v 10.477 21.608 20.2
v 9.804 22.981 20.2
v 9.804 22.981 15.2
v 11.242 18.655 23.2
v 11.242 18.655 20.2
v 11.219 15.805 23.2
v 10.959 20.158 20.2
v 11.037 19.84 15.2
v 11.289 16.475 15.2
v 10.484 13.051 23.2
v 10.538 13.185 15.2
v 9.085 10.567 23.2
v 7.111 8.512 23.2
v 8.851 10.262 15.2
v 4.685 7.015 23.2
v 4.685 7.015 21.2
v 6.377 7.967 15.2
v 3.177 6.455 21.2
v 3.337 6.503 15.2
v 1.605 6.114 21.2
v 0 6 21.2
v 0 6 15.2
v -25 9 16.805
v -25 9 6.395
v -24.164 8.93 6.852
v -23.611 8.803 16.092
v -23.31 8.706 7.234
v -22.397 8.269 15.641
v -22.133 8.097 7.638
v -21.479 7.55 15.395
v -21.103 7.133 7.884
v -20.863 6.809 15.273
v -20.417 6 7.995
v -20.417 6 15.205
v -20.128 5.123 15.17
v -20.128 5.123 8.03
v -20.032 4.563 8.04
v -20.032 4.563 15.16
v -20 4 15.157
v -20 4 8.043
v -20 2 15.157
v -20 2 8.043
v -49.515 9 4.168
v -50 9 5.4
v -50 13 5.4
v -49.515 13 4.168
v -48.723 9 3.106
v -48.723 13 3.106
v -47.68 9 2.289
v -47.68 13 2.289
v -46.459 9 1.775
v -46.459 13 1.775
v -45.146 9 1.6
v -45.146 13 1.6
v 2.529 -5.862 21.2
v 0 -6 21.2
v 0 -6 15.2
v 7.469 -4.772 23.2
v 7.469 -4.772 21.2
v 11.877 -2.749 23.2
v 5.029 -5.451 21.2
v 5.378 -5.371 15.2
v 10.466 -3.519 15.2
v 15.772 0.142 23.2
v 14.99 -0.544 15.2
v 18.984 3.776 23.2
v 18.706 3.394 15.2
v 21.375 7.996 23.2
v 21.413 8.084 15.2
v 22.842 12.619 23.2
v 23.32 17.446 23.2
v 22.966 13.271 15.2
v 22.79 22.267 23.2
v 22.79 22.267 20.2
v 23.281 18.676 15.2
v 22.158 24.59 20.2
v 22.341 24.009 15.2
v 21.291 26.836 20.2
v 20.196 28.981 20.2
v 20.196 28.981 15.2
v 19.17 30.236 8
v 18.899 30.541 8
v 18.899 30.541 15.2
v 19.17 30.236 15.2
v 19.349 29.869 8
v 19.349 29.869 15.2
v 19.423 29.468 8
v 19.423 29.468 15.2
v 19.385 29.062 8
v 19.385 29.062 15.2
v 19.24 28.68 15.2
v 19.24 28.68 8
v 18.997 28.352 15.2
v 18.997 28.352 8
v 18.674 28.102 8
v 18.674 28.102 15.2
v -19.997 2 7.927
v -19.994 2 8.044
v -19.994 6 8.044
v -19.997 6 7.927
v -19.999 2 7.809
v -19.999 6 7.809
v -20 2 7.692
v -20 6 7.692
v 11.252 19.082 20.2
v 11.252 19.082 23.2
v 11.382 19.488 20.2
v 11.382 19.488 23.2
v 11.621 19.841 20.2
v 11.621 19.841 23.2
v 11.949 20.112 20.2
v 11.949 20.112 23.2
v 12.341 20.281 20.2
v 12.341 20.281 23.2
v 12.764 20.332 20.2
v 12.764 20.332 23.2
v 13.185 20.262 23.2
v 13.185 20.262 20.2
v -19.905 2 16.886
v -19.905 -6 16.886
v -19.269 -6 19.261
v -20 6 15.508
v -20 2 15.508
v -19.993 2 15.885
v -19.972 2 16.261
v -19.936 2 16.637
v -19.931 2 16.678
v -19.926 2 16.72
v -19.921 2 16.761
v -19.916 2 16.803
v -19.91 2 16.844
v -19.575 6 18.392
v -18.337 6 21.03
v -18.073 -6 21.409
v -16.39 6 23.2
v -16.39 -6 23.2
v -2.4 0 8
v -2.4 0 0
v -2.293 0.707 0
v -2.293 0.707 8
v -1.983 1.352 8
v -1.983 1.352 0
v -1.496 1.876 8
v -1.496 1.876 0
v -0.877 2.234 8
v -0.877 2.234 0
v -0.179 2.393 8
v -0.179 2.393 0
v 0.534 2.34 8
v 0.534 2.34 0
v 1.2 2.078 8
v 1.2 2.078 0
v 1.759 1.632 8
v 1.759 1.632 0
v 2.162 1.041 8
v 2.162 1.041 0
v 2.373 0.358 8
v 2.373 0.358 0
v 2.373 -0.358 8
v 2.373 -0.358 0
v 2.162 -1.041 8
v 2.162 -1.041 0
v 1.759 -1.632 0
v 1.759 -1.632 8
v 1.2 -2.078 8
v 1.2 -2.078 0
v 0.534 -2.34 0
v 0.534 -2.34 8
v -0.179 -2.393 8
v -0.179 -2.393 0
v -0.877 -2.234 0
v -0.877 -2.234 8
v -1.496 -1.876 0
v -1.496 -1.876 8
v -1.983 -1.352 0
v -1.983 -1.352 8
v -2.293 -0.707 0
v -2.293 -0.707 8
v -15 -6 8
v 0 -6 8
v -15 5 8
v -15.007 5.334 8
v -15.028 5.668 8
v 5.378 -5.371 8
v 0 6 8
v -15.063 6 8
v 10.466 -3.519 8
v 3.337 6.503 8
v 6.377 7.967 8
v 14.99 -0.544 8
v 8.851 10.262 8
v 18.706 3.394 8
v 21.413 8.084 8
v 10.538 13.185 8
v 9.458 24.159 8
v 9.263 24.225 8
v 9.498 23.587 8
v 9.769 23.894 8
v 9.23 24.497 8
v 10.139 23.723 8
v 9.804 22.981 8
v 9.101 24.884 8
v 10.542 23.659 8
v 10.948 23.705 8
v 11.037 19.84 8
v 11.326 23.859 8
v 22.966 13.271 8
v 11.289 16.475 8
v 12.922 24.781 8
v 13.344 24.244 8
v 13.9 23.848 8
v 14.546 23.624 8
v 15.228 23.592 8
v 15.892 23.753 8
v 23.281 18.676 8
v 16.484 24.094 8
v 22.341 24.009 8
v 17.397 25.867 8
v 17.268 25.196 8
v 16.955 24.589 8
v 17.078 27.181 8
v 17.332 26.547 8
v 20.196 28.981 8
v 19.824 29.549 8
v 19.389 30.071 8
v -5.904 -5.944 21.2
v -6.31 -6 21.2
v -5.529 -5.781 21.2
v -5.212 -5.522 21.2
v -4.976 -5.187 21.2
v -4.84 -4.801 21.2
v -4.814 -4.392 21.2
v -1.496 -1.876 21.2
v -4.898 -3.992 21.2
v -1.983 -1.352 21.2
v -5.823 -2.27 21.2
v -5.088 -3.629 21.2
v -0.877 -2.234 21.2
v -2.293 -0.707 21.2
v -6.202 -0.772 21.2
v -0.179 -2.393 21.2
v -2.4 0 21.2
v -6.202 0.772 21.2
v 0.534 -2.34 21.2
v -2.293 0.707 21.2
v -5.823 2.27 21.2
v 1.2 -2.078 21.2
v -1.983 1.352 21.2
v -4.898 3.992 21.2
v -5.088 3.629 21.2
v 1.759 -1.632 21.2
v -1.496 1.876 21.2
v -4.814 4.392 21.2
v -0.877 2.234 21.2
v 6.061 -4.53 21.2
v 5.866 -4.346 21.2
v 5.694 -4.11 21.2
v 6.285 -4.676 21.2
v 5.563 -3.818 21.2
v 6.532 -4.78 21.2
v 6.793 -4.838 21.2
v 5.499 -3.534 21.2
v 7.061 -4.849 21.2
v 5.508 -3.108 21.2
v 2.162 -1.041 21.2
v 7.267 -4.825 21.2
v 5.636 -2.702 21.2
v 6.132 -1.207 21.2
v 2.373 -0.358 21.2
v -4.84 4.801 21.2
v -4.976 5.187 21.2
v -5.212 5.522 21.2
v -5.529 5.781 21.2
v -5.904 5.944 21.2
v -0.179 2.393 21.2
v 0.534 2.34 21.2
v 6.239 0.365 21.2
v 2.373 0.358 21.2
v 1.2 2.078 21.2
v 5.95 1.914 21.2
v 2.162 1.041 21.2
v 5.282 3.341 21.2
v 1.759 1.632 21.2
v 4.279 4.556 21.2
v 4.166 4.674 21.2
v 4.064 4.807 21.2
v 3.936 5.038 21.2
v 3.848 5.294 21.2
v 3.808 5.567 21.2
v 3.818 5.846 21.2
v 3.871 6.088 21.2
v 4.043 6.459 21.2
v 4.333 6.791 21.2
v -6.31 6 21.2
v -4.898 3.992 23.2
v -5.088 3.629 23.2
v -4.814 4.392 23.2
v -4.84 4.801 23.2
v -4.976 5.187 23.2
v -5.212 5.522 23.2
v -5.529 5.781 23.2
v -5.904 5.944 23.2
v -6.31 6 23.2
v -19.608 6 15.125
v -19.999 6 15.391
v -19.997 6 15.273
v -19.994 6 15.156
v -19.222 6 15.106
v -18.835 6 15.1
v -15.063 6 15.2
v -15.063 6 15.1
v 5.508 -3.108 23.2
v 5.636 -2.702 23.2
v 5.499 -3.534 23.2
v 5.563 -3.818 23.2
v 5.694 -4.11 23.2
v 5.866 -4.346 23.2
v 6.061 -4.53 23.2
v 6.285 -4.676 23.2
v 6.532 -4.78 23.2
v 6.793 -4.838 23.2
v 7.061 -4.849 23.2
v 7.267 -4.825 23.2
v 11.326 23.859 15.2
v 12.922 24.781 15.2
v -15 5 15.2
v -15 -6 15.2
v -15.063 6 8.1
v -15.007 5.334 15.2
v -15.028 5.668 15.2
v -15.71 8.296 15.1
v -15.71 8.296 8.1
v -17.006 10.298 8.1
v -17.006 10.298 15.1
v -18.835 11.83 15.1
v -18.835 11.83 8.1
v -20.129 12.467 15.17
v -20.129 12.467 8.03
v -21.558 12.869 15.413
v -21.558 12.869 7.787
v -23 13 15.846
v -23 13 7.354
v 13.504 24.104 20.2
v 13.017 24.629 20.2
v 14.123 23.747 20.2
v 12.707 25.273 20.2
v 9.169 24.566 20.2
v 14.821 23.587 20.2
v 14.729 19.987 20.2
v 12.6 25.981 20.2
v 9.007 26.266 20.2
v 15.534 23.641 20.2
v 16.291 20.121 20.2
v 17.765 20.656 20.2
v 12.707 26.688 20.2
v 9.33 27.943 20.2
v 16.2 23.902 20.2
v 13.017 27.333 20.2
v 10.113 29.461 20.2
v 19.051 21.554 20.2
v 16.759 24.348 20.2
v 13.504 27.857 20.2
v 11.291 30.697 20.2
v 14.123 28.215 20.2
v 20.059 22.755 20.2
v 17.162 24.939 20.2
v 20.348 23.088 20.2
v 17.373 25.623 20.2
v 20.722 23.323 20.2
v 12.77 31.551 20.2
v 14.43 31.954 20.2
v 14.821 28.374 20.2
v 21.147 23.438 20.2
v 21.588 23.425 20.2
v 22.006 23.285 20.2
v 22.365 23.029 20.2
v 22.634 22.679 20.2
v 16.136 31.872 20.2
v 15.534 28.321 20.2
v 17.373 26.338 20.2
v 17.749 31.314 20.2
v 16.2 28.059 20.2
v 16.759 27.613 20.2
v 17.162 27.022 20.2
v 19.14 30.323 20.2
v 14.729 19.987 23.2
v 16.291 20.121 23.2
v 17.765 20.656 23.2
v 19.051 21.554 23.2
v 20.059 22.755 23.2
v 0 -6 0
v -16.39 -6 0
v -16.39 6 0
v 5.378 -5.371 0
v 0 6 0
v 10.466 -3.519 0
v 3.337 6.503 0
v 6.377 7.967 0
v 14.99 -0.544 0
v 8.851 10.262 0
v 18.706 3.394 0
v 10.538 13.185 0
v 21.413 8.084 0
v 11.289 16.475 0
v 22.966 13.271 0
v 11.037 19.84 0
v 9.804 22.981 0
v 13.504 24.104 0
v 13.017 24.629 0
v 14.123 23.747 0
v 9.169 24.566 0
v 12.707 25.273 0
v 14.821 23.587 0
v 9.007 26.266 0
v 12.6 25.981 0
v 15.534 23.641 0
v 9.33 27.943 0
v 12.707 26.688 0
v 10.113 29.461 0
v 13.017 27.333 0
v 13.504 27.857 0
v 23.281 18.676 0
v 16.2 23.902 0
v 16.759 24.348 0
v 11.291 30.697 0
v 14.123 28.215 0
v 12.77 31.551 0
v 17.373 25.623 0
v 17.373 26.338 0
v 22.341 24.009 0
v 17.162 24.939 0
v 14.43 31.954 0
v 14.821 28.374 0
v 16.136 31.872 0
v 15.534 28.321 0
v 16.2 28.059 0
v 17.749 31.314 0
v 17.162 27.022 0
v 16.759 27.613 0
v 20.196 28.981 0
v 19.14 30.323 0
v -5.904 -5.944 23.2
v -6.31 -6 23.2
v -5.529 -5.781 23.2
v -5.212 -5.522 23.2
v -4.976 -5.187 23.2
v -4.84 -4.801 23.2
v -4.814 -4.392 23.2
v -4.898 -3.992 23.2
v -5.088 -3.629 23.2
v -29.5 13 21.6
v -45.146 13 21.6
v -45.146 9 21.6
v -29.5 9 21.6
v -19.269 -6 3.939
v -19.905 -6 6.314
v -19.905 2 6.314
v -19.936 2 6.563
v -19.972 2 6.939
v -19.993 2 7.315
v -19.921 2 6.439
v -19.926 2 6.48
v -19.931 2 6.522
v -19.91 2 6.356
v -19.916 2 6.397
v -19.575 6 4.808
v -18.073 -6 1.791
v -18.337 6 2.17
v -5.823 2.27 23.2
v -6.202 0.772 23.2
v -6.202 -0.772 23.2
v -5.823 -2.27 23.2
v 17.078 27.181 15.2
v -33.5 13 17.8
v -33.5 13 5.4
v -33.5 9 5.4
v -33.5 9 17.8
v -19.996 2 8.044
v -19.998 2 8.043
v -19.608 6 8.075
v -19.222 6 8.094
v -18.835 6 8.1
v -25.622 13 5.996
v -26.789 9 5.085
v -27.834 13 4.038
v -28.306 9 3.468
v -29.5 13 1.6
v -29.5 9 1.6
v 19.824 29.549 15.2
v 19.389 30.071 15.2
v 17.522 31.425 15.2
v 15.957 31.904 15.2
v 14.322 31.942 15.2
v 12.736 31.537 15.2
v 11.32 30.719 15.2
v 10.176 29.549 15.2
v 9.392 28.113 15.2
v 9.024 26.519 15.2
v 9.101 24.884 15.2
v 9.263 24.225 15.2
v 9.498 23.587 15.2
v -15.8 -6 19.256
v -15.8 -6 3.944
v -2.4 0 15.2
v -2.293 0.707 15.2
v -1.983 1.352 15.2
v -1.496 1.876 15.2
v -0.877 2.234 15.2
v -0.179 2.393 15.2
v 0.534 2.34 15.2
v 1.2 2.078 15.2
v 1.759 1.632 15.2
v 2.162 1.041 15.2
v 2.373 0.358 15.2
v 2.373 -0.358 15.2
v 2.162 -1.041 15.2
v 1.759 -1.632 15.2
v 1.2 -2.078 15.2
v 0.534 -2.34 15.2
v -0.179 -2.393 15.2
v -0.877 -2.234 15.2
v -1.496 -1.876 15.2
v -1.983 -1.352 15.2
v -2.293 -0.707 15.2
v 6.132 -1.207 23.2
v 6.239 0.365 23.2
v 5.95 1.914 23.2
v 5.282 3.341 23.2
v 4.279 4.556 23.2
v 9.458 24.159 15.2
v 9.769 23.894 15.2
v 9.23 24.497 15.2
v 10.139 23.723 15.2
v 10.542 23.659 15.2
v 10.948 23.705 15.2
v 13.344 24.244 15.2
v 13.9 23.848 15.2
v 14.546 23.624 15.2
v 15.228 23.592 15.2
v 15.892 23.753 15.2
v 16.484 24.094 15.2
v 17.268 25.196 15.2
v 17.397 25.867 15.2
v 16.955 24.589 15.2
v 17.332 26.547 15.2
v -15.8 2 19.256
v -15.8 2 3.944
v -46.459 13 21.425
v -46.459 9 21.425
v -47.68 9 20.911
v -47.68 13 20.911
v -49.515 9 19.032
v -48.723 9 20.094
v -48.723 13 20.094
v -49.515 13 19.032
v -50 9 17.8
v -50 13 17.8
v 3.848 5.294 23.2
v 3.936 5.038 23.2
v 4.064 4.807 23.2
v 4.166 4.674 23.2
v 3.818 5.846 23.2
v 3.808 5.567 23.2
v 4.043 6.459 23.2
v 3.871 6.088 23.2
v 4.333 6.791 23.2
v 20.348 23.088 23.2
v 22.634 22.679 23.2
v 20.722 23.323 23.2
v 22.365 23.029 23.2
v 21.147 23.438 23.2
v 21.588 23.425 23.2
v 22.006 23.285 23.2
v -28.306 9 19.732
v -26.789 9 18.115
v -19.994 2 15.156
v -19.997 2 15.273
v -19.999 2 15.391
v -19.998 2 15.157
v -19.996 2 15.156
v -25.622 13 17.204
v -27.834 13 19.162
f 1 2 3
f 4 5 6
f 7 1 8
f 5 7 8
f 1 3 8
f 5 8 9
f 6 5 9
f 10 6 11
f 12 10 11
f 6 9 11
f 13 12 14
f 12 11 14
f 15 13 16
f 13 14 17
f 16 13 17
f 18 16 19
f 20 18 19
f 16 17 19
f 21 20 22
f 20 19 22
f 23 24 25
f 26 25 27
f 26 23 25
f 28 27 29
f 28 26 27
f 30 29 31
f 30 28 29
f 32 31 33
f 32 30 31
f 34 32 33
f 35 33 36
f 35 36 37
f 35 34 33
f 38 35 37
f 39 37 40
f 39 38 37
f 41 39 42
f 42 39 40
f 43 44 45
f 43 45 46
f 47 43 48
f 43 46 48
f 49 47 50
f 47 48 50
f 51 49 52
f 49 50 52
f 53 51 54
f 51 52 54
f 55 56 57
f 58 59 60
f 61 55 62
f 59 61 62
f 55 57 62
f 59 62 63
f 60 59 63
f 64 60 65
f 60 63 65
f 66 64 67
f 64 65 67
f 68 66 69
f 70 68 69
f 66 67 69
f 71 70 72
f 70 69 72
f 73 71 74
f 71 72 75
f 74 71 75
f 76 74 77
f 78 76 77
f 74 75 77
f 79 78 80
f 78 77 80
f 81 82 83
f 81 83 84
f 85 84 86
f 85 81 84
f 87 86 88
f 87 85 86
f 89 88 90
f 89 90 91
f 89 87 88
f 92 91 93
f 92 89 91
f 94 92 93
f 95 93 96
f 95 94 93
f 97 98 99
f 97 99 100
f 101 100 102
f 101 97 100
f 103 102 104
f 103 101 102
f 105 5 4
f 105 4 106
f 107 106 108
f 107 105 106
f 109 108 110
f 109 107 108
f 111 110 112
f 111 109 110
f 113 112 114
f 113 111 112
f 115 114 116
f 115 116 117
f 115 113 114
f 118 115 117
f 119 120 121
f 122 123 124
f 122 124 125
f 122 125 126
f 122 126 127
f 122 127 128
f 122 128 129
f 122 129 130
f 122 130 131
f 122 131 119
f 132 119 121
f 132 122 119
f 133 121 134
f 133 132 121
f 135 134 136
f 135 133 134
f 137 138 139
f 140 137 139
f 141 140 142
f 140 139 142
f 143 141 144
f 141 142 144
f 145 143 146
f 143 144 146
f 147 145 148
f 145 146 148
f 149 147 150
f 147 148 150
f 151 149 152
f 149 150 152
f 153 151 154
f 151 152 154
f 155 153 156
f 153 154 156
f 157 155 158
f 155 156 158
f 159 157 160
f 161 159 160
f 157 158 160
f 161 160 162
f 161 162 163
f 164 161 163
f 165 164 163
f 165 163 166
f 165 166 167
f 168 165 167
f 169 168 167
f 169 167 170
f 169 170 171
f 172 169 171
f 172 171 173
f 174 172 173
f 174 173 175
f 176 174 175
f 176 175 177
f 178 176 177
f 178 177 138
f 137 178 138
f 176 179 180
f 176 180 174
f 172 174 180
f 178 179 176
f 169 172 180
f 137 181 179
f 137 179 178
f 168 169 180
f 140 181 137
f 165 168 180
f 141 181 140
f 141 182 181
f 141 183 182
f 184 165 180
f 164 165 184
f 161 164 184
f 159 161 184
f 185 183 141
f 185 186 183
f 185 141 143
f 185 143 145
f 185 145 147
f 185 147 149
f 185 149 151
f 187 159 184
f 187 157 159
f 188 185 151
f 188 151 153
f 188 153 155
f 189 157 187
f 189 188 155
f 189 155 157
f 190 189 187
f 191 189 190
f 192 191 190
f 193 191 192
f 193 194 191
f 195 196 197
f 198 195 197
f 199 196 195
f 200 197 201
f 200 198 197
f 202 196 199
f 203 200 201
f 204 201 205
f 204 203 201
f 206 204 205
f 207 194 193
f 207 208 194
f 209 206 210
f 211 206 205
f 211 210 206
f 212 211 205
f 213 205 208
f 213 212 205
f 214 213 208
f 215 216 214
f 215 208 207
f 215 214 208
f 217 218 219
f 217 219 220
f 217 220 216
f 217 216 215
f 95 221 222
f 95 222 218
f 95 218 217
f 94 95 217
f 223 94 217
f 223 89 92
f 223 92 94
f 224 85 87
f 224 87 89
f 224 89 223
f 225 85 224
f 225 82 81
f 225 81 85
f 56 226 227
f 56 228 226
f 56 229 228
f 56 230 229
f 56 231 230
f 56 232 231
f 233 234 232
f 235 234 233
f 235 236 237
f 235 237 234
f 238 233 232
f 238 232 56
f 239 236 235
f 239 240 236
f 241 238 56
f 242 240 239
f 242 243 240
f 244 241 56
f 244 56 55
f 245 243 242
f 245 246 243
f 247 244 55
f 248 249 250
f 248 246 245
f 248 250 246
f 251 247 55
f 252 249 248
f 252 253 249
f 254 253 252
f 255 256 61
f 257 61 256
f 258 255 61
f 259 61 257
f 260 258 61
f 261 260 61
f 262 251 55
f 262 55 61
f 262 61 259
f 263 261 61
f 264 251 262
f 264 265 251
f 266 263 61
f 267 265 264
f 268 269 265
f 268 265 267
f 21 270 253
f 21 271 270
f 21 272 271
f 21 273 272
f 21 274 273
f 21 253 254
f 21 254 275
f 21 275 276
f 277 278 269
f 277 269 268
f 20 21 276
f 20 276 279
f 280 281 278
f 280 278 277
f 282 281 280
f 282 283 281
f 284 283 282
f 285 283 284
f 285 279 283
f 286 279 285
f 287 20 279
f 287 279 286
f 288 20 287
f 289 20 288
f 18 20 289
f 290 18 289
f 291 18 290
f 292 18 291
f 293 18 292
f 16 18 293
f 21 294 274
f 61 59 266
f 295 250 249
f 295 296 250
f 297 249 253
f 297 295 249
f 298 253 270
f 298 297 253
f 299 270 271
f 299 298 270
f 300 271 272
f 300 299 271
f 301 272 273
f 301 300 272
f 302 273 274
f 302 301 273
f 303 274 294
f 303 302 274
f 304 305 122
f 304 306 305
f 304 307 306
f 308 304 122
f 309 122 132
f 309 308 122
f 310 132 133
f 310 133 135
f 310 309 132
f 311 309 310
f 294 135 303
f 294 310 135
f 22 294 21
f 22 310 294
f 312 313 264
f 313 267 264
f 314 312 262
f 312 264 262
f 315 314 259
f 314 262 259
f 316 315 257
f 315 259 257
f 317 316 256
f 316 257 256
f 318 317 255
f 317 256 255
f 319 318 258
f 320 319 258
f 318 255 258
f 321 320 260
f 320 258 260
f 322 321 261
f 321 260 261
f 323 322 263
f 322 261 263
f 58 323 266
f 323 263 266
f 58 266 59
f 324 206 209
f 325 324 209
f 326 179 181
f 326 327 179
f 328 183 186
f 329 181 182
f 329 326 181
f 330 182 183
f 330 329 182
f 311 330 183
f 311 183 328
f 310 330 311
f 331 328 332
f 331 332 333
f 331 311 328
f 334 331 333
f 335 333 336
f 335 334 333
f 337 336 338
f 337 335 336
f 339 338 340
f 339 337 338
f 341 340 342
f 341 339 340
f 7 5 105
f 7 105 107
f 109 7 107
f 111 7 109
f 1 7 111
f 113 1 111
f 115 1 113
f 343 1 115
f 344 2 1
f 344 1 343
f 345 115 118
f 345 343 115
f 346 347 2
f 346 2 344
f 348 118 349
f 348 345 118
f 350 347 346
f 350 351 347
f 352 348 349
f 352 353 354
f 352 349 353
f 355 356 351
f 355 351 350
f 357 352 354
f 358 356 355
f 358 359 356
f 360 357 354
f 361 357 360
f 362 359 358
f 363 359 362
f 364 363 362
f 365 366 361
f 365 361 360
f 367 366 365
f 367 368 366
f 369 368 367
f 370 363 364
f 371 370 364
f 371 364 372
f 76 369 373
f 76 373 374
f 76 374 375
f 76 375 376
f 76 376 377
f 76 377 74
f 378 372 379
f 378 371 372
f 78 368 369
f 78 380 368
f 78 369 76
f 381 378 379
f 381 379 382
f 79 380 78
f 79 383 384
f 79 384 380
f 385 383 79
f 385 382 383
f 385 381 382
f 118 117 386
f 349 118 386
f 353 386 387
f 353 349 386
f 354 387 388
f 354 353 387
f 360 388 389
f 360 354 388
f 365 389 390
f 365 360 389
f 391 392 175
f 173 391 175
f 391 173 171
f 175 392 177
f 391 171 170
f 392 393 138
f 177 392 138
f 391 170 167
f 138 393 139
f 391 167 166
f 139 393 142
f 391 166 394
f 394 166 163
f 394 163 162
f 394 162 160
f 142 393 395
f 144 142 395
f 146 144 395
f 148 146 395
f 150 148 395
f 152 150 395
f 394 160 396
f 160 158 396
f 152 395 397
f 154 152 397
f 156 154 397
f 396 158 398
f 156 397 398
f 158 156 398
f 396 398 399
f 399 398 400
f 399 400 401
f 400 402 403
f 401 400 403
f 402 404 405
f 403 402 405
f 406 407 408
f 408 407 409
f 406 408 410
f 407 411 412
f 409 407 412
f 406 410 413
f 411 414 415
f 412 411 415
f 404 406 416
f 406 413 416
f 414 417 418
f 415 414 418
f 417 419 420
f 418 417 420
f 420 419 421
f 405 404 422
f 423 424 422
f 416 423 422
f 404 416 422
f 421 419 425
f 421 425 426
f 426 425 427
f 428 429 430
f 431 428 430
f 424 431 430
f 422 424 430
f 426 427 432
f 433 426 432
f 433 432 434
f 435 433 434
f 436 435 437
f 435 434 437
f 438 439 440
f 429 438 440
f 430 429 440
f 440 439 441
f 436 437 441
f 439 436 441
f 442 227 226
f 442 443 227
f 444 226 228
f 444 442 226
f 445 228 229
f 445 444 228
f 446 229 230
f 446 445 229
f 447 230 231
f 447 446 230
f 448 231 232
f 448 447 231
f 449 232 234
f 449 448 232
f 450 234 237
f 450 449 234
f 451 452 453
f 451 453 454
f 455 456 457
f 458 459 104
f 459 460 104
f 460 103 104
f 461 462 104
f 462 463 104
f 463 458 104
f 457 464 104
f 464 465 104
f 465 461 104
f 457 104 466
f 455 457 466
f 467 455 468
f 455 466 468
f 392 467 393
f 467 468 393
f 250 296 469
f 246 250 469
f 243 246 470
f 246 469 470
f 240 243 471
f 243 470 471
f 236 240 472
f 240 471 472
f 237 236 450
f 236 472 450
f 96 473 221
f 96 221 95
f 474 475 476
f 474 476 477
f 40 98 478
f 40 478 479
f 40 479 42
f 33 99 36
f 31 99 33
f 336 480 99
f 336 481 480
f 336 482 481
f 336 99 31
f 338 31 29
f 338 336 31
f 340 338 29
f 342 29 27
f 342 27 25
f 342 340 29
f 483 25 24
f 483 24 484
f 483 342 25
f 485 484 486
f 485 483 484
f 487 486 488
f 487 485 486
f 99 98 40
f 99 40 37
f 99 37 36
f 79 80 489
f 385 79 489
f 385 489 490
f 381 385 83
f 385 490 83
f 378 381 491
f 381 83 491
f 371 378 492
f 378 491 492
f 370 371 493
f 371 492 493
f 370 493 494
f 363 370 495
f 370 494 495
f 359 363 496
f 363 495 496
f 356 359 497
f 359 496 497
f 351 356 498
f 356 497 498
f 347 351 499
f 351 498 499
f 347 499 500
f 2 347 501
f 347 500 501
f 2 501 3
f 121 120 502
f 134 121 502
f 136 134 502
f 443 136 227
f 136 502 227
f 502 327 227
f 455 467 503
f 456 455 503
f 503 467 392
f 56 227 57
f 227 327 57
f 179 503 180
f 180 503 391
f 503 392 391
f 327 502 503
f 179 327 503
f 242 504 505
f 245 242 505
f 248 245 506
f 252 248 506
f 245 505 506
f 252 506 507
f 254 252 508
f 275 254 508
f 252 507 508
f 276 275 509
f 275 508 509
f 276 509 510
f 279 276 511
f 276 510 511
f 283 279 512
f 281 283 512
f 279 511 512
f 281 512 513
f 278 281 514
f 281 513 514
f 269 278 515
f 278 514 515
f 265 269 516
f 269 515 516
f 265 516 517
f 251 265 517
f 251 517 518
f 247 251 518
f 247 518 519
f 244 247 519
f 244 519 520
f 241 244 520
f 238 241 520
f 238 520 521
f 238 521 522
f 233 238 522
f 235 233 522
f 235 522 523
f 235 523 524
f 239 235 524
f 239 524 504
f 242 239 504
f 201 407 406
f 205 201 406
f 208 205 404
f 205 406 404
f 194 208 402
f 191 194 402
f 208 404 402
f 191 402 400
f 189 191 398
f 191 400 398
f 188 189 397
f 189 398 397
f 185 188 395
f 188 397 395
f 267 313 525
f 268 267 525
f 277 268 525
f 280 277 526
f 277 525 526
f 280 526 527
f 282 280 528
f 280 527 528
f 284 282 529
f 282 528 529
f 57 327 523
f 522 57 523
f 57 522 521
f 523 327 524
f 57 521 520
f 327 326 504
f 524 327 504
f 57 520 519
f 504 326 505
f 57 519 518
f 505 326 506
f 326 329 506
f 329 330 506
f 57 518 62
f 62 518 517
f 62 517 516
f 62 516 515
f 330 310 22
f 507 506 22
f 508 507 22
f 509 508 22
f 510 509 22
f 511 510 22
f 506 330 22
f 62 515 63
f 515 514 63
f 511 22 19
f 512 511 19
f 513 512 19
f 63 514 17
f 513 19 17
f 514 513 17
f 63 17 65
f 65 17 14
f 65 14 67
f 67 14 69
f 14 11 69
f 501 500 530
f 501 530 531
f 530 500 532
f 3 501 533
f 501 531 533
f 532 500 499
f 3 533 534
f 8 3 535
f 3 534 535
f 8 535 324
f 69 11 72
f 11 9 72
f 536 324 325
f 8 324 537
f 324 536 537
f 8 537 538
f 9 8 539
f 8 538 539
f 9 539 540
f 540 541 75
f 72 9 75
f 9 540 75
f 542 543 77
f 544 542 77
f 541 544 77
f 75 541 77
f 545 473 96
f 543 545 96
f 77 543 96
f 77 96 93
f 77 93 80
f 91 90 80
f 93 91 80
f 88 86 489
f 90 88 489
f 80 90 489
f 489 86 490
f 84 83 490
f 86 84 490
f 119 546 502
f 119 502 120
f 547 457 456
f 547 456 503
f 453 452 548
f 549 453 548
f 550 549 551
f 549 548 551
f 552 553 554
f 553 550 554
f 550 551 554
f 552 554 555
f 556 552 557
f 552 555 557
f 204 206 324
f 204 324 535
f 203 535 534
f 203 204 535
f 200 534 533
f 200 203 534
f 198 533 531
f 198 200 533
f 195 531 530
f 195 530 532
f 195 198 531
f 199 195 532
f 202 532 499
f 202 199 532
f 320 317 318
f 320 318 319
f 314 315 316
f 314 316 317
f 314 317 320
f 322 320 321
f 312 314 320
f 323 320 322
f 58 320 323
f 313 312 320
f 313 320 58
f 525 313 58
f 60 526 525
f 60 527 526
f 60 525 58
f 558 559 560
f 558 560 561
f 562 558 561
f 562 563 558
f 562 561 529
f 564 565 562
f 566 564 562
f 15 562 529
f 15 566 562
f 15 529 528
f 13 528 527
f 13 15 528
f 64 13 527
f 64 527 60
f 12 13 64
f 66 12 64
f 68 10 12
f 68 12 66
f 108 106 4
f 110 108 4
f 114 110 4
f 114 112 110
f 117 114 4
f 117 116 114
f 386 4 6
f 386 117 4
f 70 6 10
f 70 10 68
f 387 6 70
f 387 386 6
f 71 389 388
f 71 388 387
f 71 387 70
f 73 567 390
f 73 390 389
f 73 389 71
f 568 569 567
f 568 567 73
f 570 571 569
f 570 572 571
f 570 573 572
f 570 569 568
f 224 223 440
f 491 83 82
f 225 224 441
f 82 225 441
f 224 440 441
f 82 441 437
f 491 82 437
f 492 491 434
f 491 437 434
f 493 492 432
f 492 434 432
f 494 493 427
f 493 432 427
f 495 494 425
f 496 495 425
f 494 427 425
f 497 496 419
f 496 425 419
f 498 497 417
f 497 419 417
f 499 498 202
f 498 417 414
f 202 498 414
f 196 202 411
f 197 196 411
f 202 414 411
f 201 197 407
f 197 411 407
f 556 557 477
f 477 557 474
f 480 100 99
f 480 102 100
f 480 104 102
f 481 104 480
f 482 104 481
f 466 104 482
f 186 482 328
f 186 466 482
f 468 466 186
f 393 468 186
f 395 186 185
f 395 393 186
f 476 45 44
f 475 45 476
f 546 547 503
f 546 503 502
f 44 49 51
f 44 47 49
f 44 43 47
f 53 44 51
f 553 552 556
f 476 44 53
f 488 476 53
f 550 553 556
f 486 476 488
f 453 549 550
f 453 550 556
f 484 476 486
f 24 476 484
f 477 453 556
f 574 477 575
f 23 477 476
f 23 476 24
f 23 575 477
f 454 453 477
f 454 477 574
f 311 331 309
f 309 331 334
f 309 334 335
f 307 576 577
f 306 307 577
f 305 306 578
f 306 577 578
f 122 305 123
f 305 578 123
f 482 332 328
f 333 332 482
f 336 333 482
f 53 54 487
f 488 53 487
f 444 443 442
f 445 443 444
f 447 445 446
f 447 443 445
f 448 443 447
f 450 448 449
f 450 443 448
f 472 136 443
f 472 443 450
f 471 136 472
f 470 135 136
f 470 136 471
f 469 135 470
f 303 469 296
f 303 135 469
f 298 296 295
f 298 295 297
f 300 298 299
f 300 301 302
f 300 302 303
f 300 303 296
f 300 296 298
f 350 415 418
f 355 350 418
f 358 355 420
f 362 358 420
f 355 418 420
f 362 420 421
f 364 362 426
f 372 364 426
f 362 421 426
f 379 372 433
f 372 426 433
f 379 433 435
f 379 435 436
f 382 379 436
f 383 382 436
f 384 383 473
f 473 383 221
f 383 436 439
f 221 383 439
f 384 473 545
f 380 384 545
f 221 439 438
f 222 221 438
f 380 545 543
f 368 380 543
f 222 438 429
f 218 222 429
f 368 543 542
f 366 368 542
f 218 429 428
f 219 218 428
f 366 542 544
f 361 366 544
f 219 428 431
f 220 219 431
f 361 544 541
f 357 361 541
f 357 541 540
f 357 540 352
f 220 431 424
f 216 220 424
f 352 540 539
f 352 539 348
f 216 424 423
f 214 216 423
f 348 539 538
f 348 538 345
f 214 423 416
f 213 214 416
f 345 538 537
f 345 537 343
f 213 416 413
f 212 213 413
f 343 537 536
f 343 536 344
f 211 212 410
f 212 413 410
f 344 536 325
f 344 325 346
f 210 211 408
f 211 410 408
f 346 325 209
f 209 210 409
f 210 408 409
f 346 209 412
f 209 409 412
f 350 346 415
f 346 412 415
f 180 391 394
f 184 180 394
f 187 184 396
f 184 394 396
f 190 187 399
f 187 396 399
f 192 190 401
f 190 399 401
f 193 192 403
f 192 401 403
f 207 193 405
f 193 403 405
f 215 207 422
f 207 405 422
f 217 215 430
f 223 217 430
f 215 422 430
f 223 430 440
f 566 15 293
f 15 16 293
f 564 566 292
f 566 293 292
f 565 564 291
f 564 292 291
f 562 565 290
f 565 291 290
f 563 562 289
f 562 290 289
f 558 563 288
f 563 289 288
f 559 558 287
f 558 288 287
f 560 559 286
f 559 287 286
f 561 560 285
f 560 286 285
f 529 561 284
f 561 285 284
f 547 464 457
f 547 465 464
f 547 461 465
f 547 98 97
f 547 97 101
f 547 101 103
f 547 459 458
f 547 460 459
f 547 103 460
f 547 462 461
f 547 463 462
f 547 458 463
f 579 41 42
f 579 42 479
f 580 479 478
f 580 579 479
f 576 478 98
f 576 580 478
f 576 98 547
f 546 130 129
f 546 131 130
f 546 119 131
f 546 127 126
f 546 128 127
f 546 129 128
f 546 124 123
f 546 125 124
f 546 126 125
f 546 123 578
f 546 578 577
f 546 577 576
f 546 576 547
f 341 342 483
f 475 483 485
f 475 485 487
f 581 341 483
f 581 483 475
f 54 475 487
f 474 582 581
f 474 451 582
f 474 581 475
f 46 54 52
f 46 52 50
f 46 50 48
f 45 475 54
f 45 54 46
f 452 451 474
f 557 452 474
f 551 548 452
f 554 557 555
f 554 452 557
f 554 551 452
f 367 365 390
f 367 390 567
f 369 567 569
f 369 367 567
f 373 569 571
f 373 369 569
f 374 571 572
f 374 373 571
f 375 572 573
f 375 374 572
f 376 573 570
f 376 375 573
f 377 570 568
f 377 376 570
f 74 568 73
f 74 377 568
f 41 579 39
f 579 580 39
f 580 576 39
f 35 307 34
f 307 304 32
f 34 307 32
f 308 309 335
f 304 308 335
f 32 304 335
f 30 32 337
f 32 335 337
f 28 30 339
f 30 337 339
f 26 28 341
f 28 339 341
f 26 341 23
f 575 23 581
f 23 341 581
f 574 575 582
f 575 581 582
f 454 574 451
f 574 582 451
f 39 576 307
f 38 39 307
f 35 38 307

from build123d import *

# Parameters (mm, degrees)
BOSS_EXTRUDE1_DEPTH      = 8
BOSS_EXTRUDE2_DEPTH      = 7.2
BOSS_EXTRUDE3_START      = 15.2
SKETCH1_3_R              = 6
BOSS_EXTRUDE3_DEPTH      = 8
SKETCH3_W                = 5
SKETCH3_H                = 23.2
BOSS_EXTRUDE4_DEPTH      = 12
CUT_EXTRUDE1_START       = -3
SKETCH4_R                = 6
CUT_EXTRUDE1_DEPTH       = 3
FILLET1_START            = 20.2
FILLET1_DEPTH            = 3.8
FILLET1_START_2          = 8
FILLET1_2_DEPTH          = 7.2
SKETCH7_R                = 6.25
CUT_EXTRUDE4_DEPTH       = 2
FILLET2_R                = 1.5
M4_CLEARANCE_HOLE1_D     = 4.8
CUT_EXTRUDE5_DEPTH       = 42.917610932
CUT_EXTRUDE6_START       = -12
CUT_EXTRUDE6_DEPTH       = 8
CUT_EXTRUDE7_DEPTH       = 8
BOSS_EXTRUDE5_DEPTH      = 10
CUT_EXTRUDE9_DEPTH       = 60.718970453
CUT_EXTRUDE9_DEPTH_BACK  = 60.718970453
SKETCH17_W               = 27.826832925
SKETCH17_H               = 12.4
FILLET3_R                = 5
CUT_EXTRUDE10_REACH      = 60.303
CUT_EXTRUDE11_START      = -8
CUT_EXTRUDE11_DEPTH      = 8
FILLET6_R                = 8
CUT_EXTRUDE12_DEPTH      = 61.936360284
CUT_EXTRUDE12_DEPTH_BACK = 61.936360284


with BuildPart() as part:
    # Sketch1 → Boss-Extrude1 (new body)
    with BuildSketch(Plane.XY):
        with BuildLine():
            ThreePointArc((0, -6), (20.196152423, 5.660254038), (20.196152423, 28.980762114))
            ThreePointArc((20.196152423, 28.980762114), (12, 31.176914536), (9.803847577, 22.980762114))
            ThreePointArc((9.803847577, 22.980762114), (9.803847577, 11.660254038), (0, 6))
            Line((0, 6), (-15, 6))
            Line((-15, 6), (-15, -6))
            Line((-15, -6), (0, -6))
        make_face()
    extrude(amount=BOSS_EXTRUDE1_DEPTH)

    # Sketch2 → Boss-Extrude2 (add)
    with BuildSketch(Plane.XY.offset(8)):
        with BuildLine():
            Line((9.803847577, 22.980762114), (20.196152423, 28.980762114))
            ThreePointArc((20.196152423, 28.980762114), (12, 31.176914536), (9.803847577, 22.980762114))
        make_face()
    extrude(amount=BOSS_EXTRUDE2_DEPTH)

    # Sketch1<3> → Boss-Extrude3 (add)
    with BuildSketch(Plane.XY.offset(BOSS_EXTRUDE3_START)):
        with Locations((15, 25.980762114)):
            Circle(SKETCH1_3_R)
        with BuildLine():
            ThreePointArc((9.803847577, 22.980762114), (9.803847577, 11.660254038), (0, 6))
            ThreePointArc((0, 6), (4.242640687, 4.242640687), (6, 0))
            ThreePointArc((6, 0), (4.242640687, -4.242640687), (0, -6))
            ThreePointArc((0, -6), (20.196152423, 5.660254038), (20.196152423, 28.980762114))
            ThreePointArc((20.196152423, 28.980762114), (20.795554958, 27.533676384), (21, 25.980762114))
            ThreePointArc((21, 25.980762114), (16.552914271, 20.185207156), (9.803847577, 22.980762114))
        make_face()
        Circle(SKETCH1_3_R)
        with BuildLine():
            Line((0, 6), (-15, 6))
            Line((-15, 6), (-15, -6))
            Line((-15, -6), (0, -6))
            ThreePointArc((0, -6), (-6, 0), (0, 6))
        make_face()
    extrude(amount=BOSS_EXTRUDE3_DEPTH)

    # Sketch3 → Boss-Extrude4 (add)
    with BuildSketch(Plane(origin=(0, 6, 0), x_dir=(1, 0, 0), z_dir=(0, 1, 0))):
        with Locations((-17.5, -11.6)):
            Rectangle(SKETCH3_W, SKETCH3_H)
    extrude(amount=-BOSS_EXTRUDE4_DEPTH)

    # Sketch4 → Cut-Extrude1 (cut)
    with BuildSketch(Plane.XY.offset(23.2).offset(CUT_EXTRUDE1_START)):
        with Locations((15, 25.980762114)):
            Circle(SKETCH4_R)
    extrude(amount=CUT_EXTRUDE1_DEPTH, mode=Mode.SUBTRACT)

    # Fillet1: read off the stored shape, not the designer's step
    # Fillet1 outline → Fillet1 (cut)
    with BuildSketch(Plane.XY.offset(FILLET1_START)):
        with BuildLine():
            ThreePointArc((22.78988481, 22.266945911), (21.753590077, 25.724519955), (20.196152423, 28.980762114))
            ThreePointArc((20.196152423, 28.980762114), (20.998549002, 25.848815632), (20.059212052, 22.755181017))
            ThreePointArc((20.059212052, 22.755181017), (21.58802328, 23.425369524), (22.78988481, 22.266945911))
        make_face()
        with BuildLine():
            ThreePointArc((13.184858447, 20.261910731), (11.240000131, 21.305037466), (9.803847577, 22.980762114))
            ThreePointArc((9.803847577, 22.980762114), (10.742643673, 20.891153677), (11.24153696, 18.655330111))
            ThreePointArc((11.24153696, 18.655330111), (11.775316706, 19.988281703), (13.184858447, 20.261910731))
        make_face()
    extrude(amount=FILLET1_DEPTH, mode=Mode.SUBTRACT)

    # Fillet1 2 outline → Fillet1 2 (cut)
    with BuildSketch(Plane.XY.offset(FILLET1_START_2)):
        with BuildLine():
            ThreePointArc((20.196152423, 28.980762114), (19.614014408, 29.816237449), (18.898979486, 30.541240046))
            ThreePointArc((18.898979486, 30.541240046), (19.417907488, 29.263492998), (18.674234614, 28.102082457))
            Line((18.674234614, 28.102082457), (20.196152423, 28.980762114))
        make_face()
        with BuildLine():
            ThreePointArc((11.325765386, 23.85944177), (9.948117916, 23.79610744), (9.101020514, 24.884385796))
            ThreePointArc((9.101020514, 24.884385796), (9.37137372, 23.902646091), (9.803847577, 22.980762114))
            Line((9.803847577, 22.980762114), (11.325765386, 23.85944177))
        make_face()
    extrude(amount=FILLET1_2_DEPTH, mode=Mode.SUBTRACT)

    # Sketch7 → Cut-Extrude4 (cut)
    with BuildSketch(Plane.XY.offset(23.2)):
        Circle(SKETCH7_R)
    extrude(amount=-CUT_EXTRUDE4_DEPTH, mode=Mode.SUBTRACT)

    # Fillet2
    fillet2_edges = [part.edges().sort_by_distance(p)[0] for p in [
        (-1.75, 6, 22.2),
        (1.412020937, 6.08840676, 22.2),
        (-1.75, -6, 22.2),
        (2.028685625, -5.91159324, 22.2),
    ]]
    fillet(fillet2_edges, radius=FILLET2_R)

    # M4 Clearance Hole1 (through all)
    with Locations(Plane.XY.offset(23.2)):
        with Locations((0, 0), (15, 25.980762114)):
            Hole(M4_CLEARANCE_HOLE1_D / 2)

    # Sketch8 → Cut-Extrude5 (cut, symmetric)
    with BuildSketch(Plane(origin=(0, 6, 0), x_dir=(1, 0, 0), z_dir=(0, 1, 0))):
        with BuildLine():
            Line((-16.389921041, 0), (-20, 0))
            Line((-20, 0), (-20, -7.692132935))
            ThreePointArc((-20, -7.692132935), (-19.052602124, -3.443557315), (-16.389921041, 0))
        make_face()
    cut_extrude5 = extrude(amount=CUT_EXTRUDE5_DEPTH, both=True, mode=Mode.SUBTRACT)

    # Mirror1: Cut-Extrude5 across plane
    add(cut_extrude5.mirror(Plane.XY.offset(11.6)), mode=Mode.SUBTRACT)

    # Sketch12 → Cut-Extrude6 (cut)
    with BuildSketch(Plane(origin=(0, 6, 0), x_dir=(1, 0, 0), z_dir=(0, 1, 0)).offset(CUT_EXTRUDE6_START)):
        Polygon((-20, -6.6), (-20, -16.6), (-16, -18.909401077), (-16, -4.290598923), align=None)
    extrude(amount=CUT_EXTRUDE6_DEPTH, mode=Mode.SUBTRACT)

    # Sketch13 → Cut-Extrude7 (cut)
    with BuildSketch(Plane.XZ.offset(6)):
        Polygon((-16, 4.290598923), (-19.936057883, 6.563083001), (-19.986057883, 6.476480461), (-15.9, 4.117393842), (-15.9, 19.082606158), (-19.986057883, 16.723519539), (-19.936057883, 16.636916999), (-16, 18.909401077), align=None)
    extrude(amount=-CUT_EXTRUDE7_DEPTH, mode=Mode.SUBTRACT)

    # Sketch14 → Boss-Extrude5 (add, symmetric)
    with BuildSketch(Plane.XY.offset(11.6)):
        with BuildLine():
            Line((-15, 6), (-15, 13))
            Line((-15, 13), (-50, 13))
            Line((-50, 13), (-50, 9))
            Line((-50, 9), (-25, 9))
            ThreePointArc((-25, 9), (-21.464466094, 7.535533906), (-20, 4))
            Line((-20, 4), (-20, 6))
            Line((-20, 6), (-15, 6))
        make_face()
    extrude(amount=BOSS_EXTRUDE5_DEPTH, both=True)

    # Sketch17 → Cut-Extrude9 (cut, two sides: drawn at the far end of the back side and taken through both)
    with BuildSketch(Plane.XZ.offset(-9).offset(-CUT_EXTRUDE9_DEPTH_BACK)):
        with Locations((-47.413416463, 11.6)):
            Rectangle(SKETCH17_W, SKETCH17_H)
    extrude(amount=CUT_EXTRUDE9_DEPTH + CUT_EXTRUDE9_DEPTH_BACK, mode=Mode.SUBTRACT)

    # Fillet3
    # the kernel refuses this fillet: 5 mm, written as the material it takes off along each edge
    with BuildSketch(Plane(origin=(-50, 25.1346611, 21.6), x_dir=(1, 0, 0), z_dir=(0, -1, 0))) as fillet3_piece_1:
        with BuildLine():
            CenterArc((4.85386444, -5), FILLET3_R, 90, 76.113459637)
            Line((0, -3.8), (-0.097077289, -3.776))
            ThreePointArc((-0.097077289, -3.776), (-0.1, -1.9), (-0.1, 0))
            Line((-0.1, 0), (0, 0.1))
            Line((0, 0.1), (4.85386444, 0.1))
            Line((4.85386444, 0.1), (4.85386444, 0))
        make_face()
    extrude(amount=28.269322199, mode=Mode.SUBTRACT)
    with BuildSketch(Plane(origin=(-50, 25.1346611, 1.6), x_dir=(1, 0, 0), z_dir=(0, -1, 0))) as fillet3_piece_2:
        with BuildLine():
            CenterArc((4.85386444, 5), FILLET3_R, 193.886540363, 76.113459637)
            Line((0, 3.8), (-0.097077289, 3.776))
            ThreePointArc((-0.097077289, 3.776), (-0.1, 1.9), (-0.1, 0))
            Line((-0.1, 0), (0, -0.1))
            Line((0, -0.1), (4.85386444, -0.1))
            Line((4.85386444, -0.1), (4.85386444, 0))
        make_face()
    extrude(amount=28.269322199, mode=Mode.SUBTRACT)

    # Cut-Extrude10: up to this face of the body (flat: up to its plane)
    cut_extrude10_end = Plane(part.part.faces().sort_by_distance((-8.271042779, 6, 18.958105224))[0])
    # Sketch18 → Cut-Extrude10 (cut, up to the picked face)
    with BuildSketch(Plane(origin=(0, 13, 0), x_dir=(1, 0, 0), z_dir=(0, 1, 0)), mode=Mode.PRIVATE) as cut_extrude10_sk1:
        with BuildLine():
            Line((-15, -8.1), (-18.834635496, -8.1))
            ThreePointArc((-18.834635496, -8.1), (-25.079633495, -6.346950766), (-29.5, -1.6))
            Line((-29.5, -1.6), (-15, -1.6))
            Line((-15, -1.6), (-15, -8.1))
        make_face()
    cut_extrude10_tool1 = split(extrude(cut_extrude10_sk1.sketch, amount=-CUT_EXTRUDE10_REACH, mode=Mode.PRIVATE), bisect_by=cut_extrude10_end, keep=Keep.BOTH, mode=Mode.PRIVATE)
    # Sketch18 → Cut-Extrude10 (cut, up to the picked face)
    with BuildSketch(Plane(origin=(0, 13, 0), x_dir=(1, 0, 0), z_dir=(0, 1, 0)), mode=Mode.PRIVATE) as cut_extrude10_sk2:
        with BuildLine():
            Line((-15, -15.1), (-18.834635496, -15.1))
            ThreePointArc((-18.834635496, -15.1), (-25.079633495, -16.853049234), (-29.5, -21.6))
            Line((-29.5, -21.6), (-15, -21.6))
            Line((-15, -21.6), (-15, -15.1))
        make_face()
    cut_extrude10_tool2 = split(extrude(cut_extrude10_sk2.sketch, amount=-CUT_EXTRUDE10_REACH, mode=Mode.PRIVATE), bisect_by=cut_extrude10_end, keep=Keep.BOTH, mode=Mode.PRIVATE)
    add(cut_extrude10_tool1.solids().sort_by(Axis((-20.984013, 13, 4.465435), (0, -1, 0)))[0], mode=Mode.SUBTRACT)
    add(cut_extrude10_tool2.solids().sort_by(Axis((-20.984013, 13, 18.734565), (0, -1, 0)))[0], mode=Mode.SUBTRACT)

    # Sketch19 → Cut-Extrude11 (cut)
    with BuildSketch(Plane.XZ.offset(6).offset(CUT_EXTRUDE11_START)):
        with BuildLine():
            Line((-20.014032682, 6.377161665), (-15.8, 3.944188762))
            Line((-15.8, 3.944188762), (-15.8, 19.255811238))
            Line((-15.8, 19.255811238), (-20.014032682, 16.822838335))
            ThreePointArc((-20.014032682, 16.822838335), (-20.078485255, 16.166756248), (-20.1, 15.507867065))
            Line((-20.1, 15.507867065), (-20.1, 7.692132935))
            ThreePointArc((-20.1, 7.692132935), (-20.078485255, 7.033243752), (-20.014032682, 6.377161665))
        make_face()
        with BuildLine():
            Line((-19.921174748, 6.439020166), (-15.9, 4.117393842))
            Line((-15.9, 4.117393842), (-15.9, 19.082606158))
            Line((-15.9, 19.082606158), (-19.921174748, 16.760979834))
            ThreePointArc((-19.921174748, 16.760979834), (-19.980274232, 16.135661823), (-20, 15.507867065))
            Line((-20, 15.507867065), (-20, 7.692132935))
            ThreePointArc((-20, 7.692132935), (-19.980274232, 7.064338177), (-19.921174748, 6.439020166))
        make_face(mode=Mode.SUBTRACT)
    extrude(amount=CUT_EXTRUDE11_DEPTH, mode=Mode.SUBTRACT)

    # Fillet6
    fillet6_edges = [part.edges().sort_by_distance(p)[0] for p in [
        (-15, 13, 11.6),
    ]]
    fillet(fillet6_edges, radius=FILLET6_R)

    # Sketch20 → Cut-Extrude12 (cut, two sides: drawn at the far end of the back side and taken through both)
    with BuildSketch(Plane(origin=(0, 6, 0), x_dir=(1, 0, 0), z_dir=(0, 1, 0)).offset(-CUT_EXTRUDE12_DEPTH_BACK)):
        with BuildLine():
            Line((-16.389921041, 0), (-23, 0))
            Line((-23, 0), (-23, -7.353876601))
            ThreePointArc((-23, -7.353876601), (-21.519167163, -7.795866352), (-19.993811725, -8.043881717))
            ThreePointArc((-19.993811725, -8.043881717), (-19.125934643, -3.603451376), (-16.389921041, 0))
        make_face()
        with BuildLine():
            Line((-23, -23.2), (-23, -15.846123399))
            ThreePointArc((-23, -15.846123399), (-21.519167163, -15.404133648), (-19.993811725, -15.156118283))
            ThreePointArc((-19.993811725, -15.156118283), (-19.125934643, -19.596548624), (-16.389921041, -23.2))
            Line((-16.389921041, -23.2), (-23, -23.2))
        make_face()
    extrude(amount=CUT_EXTRUDE12_DEPTH + CUT_EXTRUDE12_DEPTH_BACK, mode=Mode.SUBTRACT)


solid = part.part
